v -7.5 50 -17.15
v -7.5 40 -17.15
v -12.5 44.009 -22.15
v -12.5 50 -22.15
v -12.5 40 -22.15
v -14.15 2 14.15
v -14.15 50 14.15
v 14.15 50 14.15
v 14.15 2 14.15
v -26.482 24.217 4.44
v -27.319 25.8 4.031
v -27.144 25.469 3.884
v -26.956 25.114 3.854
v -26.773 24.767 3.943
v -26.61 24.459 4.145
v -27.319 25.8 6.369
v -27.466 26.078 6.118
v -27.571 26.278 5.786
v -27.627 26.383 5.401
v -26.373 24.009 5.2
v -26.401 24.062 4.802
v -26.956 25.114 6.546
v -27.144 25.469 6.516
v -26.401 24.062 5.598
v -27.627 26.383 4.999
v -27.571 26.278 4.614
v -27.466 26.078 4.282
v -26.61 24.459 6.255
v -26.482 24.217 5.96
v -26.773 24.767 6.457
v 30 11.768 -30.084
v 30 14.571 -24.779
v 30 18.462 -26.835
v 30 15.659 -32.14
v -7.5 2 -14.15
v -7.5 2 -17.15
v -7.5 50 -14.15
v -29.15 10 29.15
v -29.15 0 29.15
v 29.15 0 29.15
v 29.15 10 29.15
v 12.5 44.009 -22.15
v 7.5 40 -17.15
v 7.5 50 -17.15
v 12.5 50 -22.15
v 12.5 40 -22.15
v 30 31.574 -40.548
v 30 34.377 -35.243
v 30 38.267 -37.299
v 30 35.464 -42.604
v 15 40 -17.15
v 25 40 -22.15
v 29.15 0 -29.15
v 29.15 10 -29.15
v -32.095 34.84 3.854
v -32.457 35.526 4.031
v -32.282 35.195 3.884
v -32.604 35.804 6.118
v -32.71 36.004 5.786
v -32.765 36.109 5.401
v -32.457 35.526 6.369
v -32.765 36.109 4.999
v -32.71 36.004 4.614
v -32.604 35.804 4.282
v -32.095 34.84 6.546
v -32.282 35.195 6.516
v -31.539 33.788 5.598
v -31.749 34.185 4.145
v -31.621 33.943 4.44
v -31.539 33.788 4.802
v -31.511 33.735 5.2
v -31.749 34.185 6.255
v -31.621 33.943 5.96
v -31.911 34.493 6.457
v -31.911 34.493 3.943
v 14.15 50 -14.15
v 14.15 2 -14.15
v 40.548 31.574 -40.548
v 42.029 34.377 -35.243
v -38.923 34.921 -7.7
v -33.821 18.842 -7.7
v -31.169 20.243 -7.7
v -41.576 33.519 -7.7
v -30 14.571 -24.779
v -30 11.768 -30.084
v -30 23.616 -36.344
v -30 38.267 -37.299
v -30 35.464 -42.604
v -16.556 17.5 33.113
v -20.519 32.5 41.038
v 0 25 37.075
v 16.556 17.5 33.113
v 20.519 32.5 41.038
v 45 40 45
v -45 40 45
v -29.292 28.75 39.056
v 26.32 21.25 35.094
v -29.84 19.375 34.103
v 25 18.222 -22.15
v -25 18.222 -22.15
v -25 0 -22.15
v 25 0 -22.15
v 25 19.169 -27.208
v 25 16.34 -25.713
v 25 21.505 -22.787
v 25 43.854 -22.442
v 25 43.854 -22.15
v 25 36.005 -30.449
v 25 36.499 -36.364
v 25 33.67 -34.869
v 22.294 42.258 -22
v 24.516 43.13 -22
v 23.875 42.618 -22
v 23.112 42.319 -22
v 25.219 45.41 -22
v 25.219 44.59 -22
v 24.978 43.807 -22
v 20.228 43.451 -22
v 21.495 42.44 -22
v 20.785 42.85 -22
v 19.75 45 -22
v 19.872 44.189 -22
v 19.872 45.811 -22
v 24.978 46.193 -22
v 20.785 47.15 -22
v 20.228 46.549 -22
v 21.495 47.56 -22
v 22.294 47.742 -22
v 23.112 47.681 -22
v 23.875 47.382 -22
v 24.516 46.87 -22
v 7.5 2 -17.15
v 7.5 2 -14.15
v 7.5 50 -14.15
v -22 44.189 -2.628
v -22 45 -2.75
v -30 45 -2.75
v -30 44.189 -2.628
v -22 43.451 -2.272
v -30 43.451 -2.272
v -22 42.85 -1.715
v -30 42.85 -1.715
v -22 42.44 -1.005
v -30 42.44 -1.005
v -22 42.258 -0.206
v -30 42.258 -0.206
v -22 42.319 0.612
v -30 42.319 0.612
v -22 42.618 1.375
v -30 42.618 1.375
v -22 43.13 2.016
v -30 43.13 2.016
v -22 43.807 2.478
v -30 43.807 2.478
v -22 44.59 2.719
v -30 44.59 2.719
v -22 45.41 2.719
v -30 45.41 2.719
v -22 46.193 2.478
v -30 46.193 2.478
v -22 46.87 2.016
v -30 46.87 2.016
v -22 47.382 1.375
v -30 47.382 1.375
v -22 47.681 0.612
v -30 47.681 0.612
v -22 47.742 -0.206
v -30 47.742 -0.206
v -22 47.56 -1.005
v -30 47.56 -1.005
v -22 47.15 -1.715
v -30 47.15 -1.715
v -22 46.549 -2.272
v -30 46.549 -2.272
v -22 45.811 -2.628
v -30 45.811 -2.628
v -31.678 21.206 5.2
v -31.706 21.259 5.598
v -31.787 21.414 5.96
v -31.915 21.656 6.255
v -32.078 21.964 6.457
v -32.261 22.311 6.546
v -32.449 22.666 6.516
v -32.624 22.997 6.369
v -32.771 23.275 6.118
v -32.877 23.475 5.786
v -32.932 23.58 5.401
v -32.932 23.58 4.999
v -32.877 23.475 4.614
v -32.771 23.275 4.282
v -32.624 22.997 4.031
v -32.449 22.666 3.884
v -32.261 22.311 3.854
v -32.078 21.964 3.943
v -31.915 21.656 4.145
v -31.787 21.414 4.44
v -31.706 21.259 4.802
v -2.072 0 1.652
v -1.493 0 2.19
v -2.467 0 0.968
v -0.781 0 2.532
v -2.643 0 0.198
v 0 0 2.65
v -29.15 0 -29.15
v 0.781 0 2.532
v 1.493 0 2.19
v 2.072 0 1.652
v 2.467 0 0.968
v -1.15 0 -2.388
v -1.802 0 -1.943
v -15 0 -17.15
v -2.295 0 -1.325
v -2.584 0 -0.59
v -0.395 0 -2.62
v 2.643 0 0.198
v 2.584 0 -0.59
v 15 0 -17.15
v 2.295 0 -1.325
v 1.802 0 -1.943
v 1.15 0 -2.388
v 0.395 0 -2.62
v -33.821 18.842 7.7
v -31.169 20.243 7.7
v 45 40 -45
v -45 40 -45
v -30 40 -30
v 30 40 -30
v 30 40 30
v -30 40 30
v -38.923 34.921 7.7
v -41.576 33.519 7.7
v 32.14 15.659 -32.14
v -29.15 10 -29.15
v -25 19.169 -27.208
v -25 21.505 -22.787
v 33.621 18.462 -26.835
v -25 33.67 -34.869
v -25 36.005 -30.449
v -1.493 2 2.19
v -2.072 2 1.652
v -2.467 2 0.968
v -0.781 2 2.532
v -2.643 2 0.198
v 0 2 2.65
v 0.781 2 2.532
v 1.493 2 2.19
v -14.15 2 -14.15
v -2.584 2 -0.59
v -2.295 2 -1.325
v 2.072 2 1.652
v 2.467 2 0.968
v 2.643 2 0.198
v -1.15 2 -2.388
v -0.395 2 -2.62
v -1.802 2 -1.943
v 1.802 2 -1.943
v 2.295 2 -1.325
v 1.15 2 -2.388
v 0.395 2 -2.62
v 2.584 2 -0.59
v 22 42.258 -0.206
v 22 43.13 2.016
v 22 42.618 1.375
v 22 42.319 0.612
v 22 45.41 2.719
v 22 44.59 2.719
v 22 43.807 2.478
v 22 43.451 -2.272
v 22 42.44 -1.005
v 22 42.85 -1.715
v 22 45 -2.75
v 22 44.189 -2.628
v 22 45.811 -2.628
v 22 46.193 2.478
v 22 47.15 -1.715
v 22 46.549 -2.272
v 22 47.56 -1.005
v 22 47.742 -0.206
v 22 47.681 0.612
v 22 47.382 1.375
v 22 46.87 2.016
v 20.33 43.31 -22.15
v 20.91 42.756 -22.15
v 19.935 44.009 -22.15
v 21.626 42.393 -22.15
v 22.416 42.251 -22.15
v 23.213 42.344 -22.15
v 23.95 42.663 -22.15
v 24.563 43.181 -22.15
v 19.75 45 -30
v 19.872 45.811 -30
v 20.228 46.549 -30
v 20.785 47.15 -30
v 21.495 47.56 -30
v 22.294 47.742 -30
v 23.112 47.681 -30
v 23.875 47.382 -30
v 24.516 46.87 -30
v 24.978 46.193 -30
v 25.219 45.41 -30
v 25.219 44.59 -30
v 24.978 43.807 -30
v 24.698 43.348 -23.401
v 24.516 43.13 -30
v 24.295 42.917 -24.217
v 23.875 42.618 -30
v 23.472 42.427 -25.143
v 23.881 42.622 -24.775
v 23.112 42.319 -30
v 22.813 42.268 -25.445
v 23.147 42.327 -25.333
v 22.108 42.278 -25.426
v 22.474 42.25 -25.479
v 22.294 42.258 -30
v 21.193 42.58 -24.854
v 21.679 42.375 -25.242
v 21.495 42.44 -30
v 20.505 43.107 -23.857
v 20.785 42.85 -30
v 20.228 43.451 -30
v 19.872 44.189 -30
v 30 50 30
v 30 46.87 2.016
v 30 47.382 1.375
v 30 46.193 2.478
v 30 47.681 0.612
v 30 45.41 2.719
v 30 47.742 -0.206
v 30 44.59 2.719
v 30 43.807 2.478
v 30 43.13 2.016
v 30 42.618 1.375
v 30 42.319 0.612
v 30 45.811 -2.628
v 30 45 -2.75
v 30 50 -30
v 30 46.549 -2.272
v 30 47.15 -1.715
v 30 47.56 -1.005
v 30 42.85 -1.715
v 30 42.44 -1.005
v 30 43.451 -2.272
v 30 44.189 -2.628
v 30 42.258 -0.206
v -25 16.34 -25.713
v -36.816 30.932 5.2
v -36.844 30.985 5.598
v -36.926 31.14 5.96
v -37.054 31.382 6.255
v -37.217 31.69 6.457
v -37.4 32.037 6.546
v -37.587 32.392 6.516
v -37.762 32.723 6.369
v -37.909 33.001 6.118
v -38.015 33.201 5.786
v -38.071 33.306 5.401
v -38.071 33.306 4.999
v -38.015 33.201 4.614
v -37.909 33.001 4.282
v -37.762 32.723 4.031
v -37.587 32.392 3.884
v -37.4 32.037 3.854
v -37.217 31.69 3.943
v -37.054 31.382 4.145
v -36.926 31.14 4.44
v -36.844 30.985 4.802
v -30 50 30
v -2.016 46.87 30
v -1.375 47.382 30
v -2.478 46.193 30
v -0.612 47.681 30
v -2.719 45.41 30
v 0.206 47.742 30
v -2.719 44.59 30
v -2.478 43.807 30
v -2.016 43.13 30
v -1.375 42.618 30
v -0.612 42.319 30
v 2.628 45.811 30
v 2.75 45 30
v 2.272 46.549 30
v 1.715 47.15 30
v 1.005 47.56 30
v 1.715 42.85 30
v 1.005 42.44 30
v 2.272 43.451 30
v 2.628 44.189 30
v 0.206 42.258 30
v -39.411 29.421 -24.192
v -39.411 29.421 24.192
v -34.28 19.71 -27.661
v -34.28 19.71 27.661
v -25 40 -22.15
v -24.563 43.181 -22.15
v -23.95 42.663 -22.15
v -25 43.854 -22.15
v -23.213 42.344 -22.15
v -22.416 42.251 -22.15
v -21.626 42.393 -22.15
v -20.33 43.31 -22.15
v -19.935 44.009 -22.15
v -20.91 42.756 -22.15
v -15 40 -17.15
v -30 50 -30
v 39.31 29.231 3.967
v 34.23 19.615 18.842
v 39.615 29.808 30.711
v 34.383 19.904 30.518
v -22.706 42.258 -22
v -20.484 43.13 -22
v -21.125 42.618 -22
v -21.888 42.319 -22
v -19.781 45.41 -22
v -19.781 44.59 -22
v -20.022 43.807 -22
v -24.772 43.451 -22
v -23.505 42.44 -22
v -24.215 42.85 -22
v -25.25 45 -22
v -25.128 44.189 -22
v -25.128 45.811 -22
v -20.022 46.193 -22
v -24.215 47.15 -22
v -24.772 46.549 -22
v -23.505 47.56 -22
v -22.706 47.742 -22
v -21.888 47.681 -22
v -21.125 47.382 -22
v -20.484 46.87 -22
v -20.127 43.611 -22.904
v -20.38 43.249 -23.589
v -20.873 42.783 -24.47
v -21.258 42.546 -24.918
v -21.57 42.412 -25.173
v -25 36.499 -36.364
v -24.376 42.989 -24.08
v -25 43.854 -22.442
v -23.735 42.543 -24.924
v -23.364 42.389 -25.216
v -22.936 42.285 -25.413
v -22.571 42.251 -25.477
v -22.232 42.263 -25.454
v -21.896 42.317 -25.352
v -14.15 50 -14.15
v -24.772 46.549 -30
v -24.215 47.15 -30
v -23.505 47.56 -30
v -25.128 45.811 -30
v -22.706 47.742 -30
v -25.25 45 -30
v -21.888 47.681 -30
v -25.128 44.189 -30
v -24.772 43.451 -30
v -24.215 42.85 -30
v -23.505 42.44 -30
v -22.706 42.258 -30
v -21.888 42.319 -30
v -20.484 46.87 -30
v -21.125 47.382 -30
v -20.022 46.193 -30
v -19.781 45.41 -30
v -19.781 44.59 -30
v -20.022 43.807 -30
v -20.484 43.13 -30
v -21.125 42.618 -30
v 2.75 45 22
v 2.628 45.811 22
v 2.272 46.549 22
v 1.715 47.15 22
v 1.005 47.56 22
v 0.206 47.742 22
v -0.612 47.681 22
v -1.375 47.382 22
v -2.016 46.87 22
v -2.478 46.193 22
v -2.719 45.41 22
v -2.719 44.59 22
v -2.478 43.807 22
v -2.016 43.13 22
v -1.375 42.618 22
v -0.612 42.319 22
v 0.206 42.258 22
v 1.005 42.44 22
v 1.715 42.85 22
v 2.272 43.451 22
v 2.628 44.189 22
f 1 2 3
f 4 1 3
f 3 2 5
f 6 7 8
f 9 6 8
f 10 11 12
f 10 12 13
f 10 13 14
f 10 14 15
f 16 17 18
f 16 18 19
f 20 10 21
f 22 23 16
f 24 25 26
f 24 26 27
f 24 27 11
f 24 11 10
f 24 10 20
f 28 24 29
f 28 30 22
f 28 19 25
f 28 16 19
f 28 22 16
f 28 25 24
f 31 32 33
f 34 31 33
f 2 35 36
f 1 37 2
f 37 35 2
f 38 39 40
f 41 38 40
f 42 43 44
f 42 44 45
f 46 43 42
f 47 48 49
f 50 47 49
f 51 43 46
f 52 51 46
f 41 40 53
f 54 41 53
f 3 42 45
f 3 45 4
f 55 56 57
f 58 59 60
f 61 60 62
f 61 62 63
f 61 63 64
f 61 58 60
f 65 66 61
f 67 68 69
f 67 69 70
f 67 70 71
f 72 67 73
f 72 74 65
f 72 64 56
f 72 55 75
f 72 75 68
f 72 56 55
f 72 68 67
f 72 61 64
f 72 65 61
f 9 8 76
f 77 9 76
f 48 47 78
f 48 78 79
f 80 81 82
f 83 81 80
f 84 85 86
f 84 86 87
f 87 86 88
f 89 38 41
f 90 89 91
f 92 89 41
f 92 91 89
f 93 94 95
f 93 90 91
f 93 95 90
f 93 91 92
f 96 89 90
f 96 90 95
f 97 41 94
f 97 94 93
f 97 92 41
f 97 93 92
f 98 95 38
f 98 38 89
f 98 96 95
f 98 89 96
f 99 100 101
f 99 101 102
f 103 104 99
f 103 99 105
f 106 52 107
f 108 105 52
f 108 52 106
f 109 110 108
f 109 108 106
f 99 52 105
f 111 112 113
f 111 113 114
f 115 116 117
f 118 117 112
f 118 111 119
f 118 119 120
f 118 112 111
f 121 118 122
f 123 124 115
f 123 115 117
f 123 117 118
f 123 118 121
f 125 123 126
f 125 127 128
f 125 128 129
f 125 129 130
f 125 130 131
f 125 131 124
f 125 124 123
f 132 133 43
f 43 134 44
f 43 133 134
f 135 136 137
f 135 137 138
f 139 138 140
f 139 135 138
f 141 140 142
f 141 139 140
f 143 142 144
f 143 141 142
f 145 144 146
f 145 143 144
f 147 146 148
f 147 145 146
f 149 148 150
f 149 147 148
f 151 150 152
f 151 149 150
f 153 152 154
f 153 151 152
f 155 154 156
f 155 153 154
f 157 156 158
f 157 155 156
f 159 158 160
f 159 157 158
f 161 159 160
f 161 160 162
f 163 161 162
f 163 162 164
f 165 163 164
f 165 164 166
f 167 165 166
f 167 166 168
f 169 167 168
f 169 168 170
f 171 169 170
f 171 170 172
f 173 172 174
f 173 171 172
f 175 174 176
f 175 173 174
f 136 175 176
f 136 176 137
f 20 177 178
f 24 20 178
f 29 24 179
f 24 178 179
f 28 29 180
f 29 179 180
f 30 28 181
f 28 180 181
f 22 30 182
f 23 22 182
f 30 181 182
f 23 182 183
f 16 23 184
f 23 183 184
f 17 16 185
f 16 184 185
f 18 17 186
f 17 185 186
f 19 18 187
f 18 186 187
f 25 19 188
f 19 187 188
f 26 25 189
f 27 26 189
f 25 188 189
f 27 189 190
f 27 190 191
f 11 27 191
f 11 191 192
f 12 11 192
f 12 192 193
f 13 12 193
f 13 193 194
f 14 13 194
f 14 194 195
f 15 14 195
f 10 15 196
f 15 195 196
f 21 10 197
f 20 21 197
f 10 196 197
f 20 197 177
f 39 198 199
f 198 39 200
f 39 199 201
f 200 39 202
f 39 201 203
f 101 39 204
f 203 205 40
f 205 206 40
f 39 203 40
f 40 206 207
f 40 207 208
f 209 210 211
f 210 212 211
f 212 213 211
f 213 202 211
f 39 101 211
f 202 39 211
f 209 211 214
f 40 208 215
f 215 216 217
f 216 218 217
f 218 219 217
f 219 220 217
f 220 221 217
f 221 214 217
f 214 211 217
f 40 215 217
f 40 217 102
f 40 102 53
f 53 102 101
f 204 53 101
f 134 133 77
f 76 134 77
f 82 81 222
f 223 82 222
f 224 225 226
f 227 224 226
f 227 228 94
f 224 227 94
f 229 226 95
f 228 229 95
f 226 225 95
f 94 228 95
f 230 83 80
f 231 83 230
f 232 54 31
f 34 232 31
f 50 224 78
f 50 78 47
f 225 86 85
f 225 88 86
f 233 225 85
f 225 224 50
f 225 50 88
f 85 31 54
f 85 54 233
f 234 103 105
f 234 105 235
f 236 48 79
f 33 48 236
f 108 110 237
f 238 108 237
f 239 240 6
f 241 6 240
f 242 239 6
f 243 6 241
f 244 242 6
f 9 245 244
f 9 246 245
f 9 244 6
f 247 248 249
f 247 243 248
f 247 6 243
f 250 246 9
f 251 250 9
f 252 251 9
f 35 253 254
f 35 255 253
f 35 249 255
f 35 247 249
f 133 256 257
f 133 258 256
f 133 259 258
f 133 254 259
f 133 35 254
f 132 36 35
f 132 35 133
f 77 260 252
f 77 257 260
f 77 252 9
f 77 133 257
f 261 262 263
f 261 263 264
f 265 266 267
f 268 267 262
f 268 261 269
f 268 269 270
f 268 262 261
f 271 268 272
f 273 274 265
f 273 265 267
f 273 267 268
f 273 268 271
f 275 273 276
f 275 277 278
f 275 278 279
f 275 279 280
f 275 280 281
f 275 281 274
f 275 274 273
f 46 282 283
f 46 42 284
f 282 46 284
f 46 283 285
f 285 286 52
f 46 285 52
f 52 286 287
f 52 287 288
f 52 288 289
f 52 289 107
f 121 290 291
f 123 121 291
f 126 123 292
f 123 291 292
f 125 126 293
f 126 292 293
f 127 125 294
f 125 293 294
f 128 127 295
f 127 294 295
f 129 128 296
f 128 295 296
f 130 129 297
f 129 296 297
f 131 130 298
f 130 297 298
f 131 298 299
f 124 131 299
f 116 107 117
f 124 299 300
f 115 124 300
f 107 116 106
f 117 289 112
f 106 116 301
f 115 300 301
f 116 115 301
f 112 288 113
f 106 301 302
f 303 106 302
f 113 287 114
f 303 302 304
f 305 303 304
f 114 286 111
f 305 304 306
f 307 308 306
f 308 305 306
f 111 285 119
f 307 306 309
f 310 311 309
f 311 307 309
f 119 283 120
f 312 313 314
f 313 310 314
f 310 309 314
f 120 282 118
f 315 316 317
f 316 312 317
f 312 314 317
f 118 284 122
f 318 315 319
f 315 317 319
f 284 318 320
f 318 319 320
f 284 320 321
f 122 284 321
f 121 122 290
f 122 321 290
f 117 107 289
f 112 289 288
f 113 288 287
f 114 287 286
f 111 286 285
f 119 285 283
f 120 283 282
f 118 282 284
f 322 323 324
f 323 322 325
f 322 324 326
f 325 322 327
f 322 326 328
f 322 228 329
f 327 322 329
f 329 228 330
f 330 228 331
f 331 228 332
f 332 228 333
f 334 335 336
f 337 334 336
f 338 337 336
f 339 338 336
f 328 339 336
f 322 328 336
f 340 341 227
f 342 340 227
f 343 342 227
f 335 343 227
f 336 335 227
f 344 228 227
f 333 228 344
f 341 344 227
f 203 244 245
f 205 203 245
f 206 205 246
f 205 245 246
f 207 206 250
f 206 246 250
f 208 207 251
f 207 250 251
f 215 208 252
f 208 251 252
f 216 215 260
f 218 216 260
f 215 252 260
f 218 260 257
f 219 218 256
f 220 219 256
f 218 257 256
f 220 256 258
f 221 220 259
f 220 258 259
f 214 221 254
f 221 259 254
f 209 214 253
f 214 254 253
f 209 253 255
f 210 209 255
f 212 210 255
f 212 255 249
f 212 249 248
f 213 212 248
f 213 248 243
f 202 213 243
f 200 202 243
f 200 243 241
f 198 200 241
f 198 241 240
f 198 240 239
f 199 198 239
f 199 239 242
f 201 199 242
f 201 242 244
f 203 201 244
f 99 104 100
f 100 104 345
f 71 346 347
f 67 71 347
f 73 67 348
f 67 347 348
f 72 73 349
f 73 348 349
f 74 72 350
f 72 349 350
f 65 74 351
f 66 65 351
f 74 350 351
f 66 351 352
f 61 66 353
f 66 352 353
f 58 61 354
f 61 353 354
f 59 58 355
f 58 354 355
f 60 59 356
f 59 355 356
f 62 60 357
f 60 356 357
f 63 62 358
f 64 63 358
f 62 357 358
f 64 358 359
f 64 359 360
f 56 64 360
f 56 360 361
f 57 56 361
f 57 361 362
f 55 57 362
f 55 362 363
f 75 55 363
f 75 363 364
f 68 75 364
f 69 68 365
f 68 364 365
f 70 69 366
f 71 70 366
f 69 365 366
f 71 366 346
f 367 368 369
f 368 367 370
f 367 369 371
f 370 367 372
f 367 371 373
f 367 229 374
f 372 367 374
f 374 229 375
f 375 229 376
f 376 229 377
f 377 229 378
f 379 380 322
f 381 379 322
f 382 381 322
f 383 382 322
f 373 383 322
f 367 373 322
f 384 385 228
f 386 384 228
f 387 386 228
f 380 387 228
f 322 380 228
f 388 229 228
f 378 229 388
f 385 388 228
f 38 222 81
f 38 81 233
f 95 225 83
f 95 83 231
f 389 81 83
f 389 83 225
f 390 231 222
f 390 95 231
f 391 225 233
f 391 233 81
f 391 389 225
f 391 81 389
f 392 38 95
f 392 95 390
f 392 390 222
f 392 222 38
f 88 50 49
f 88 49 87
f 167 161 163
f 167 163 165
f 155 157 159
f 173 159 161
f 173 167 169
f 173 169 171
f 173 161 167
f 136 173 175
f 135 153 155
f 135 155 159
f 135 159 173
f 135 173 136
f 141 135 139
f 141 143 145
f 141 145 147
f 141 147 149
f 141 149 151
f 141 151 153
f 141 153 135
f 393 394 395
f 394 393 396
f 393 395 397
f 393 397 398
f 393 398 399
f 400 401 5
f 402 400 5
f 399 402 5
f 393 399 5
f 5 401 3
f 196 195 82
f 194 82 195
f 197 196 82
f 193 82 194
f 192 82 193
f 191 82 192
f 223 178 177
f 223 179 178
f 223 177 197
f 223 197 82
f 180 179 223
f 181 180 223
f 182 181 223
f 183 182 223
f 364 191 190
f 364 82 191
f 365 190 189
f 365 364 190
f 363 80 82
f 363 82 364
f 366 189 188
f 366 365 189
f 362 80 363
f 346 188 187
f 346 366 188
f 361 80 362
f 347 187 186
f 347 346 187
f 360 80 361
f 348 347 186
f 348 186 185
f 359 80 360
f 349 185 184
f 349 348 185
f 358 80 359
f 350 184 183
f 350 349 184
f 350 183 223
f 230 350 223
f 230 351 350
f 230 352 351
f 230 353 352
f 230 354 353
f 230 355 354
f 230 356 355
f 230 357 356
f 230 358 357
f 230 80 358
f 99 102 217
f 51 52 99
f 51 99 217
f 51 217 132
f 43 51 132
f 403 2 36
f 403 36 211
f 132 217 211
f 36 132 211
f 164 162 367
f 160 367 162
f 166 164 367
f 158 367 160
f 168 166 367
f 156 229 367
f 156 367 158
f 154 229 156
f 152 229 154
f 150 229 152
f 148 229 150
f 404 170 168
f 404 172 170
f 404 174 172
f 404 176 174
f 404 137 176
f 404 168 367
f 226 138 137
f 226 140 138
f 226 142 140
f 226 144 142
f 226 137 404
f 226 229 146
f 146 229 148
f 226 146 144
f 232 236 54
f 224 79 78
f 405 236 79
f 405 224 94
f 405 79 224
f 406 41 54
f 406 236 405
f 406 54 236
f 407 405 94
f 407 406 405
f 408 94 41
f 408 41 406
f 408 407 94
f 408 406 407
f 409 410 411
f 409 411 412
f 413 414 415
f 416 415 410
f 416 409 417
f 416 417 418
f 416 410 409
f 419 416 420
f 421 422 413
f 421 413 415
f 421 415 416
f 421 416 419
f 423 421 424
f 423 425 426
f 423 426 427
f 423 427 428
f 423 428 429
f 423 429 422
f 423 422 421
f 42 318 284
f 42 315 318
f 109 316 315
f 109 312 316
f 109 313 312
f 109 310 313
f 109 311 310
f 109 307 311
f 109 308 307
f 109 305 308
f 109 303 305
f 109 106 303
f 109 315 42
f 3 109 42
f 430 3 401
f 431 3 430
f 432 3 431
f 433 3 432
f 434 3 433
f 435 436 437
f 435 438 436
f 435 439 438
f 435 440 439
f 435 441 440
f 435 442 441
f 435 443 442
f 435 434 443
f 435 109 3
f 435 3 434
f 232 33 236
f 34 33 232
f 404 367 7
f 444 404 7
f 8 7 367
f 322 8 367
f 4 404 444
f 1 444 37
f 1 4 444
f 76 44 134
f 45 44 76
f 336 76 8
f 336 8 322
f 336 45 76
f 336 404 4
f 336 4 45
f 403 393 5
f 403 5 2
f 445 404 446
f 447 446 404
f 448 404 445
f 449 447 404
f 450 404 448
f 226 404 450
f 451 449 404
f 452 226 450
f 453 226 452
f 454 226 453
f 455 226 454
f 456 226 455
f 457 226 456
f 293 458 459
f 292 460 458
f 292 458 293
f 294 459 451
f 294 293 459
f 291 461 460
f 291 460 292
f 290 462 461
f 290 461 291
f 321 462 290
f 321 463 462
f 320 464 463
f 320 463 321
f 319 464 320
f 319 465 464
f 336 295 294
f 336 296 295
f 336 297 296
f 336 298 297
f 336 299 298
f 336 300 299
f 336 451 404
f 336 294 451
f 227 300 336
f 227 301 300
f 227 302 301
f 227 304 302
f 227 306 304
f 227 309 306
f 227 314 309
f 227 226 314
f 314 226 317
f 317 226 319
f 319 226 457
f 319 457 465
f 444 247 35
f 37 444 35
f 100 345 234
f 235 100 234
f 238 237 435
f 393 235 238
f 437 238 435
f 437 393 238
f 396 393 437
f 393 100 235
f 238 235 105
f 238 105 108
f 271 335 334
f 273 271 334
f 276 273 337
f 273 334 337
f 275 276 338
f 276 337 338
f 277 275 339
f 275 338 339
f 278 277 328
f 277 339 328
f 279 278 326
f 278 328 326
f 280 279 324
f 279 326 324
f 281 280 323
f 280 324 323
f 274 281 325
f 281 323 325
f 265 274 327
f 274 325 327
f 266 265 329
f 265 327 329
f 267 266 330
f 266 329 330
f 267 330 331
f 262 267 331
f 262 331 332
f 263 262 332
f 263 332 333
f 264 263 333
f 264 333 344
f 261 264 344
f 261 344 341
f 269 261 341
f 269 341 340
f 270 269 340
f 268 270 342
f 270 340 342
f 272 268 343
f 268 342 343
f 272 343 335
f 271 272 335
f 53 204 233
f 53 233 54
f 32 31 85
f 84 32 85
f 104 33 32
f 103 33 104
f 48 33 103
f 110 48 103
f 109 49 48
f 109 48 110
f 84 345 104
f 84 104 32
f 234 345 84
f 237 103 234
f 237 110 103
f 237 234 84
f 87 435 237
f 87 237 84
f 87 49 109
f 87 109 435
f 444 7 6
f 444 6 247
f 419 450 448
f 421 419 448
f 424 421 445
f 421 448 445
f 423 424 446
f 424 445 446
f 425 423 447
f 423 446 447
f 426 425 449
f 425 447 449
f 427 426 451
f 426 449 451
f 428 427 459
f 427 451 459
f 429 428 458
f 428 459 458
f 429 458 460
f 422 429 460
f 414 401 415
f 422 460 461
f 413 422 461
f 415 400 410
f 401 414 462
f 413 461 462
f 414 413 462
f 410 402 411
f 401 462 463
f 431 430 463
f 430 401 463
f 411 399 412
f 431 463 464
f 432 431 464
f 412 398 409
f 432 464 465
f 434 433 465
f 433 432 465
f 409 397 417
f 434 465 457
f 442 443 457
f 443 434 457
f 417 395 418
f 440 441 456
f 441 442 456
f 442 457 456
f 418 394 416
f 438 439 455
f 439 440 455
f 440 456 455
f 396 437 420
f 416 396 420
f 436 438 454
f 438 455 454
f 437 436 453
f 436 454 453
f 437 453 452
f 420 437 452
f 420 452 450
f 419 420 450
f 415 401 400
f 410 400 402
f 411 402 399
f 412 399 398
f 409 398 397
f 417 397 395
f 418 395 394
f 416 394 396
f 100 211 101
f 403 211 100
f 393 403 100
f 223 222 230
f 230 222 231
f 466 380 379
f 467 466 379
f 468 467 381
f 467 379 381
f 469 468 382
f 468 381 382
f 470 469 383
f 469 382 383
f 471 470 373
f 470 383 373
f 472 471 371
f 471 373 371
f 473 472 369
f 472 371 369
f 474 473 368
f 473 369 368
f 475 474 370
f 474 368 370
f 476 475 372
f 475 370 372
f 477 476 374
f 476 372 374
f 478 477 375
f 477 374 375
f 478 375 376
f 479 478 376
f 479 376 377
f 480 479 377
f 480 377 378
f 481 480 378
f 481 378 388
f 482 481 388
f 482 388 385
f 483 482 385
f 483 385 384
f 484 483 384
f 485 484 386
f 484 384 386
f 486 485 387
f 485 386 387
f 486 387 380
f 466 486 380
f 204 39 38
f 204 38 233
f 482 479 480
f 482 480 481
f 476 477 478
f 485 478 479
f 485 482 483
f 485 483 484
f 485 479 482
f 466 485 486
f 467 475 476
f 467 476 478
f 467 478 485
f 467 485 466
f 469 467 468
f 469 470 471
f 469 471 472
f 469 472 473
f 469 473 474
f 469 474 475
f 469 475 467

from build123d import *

# Parameters (mm, degrees)
SKETCH1_W                = 58.3
SKETCH1_H                = 58.3
SKETCH1_W_2              = 28.3
SKETCH1_H_2              = 28.3
BOSS_EXTRUDE1_DEPTH      = 10
SKETCH4_W                = 60
SKETCH4_H                = 60
BOSS_EXTRUDE2_DEPTH      = 10
SKETCH6_W                = 60
SKETCH6_H                = 26.8
ESP32_DEPTH              = 6
SKETCH8_W                = 28.3
SKETCH8_H                = 28.3
CUT_EXTRUDE3_DEPTH       = 48
SKETCH10_W               = 30
SKETCH10_H               = 5
CUT_EXTRUDE5_DEPTH       = 50
CUT_EXTRUDE2_REACH       = 95.195
SKETCH7_W                = 50
SKETCH7_H                = 3.2
CUT_EXTRUDE6_START       = -10
CUT_EXTRUDE6_DEPTH       = 71.932070392
CUT_EXTRUDE7_START       = -25
CUT_EXTRUDE7_DEPTH       = 50
CUT_EXTRUDE8_REACH       = 102.747
SKETCH14_W               = 15
SKETCH14_H               = 3
CUT_EXTRUDE9_DEPTH       = 48
CHAMFER1_SIZE            = 7.5
CUT_EXTRUDE10_REACH      = 81.712
SKETCH15_R               = 2.65
SKETCH16_W               = 15.4
SKETCH16_H               = 16.6
CANBUS_DEPTH             = 3
SKETCH18_R               = 1.35
M2_CANBUS_HEAT_SET_DEPTH = 6
SKETCH19_R               = 2.75
CUT_EXTRUDE13_DEPTH      = 8
SKETCH20_R               = 2.75
CUT_EXTRUDE14_DEPTH      = 8
SKETCH21_R               = 2.75
CUT_EXTRUDE15_DEPTH      = 8
CUT_EXTRUDE16_START      = -8
SKETCH22_R               = 2.75
CUT_EXTRUDE16_DEPTH      = 8


# Read off the part's stored shape, not the designer's step: Cut-Extrude7
with BuildPart() as part:
    # Sketch1 → Boss-Extrude1 (new body)
    # profile 1 of 2: a face of its own
    with BuildSketch(Plane(origin=(0, 0, 0), x_dir=(1, 0, 0), z_dir=(0, 1, 0))):
        Rectangle(SKETCH1_W, SKETCH1_H)
        Rectangle(SKETCH1_W_2, SKETCH1_H_2, mode=Mode.SUBTRACT)
    # profile 2 of 2: a face of its own
    with BuildSketch(Plane(origin=(0, 0, 0), x_dir=(1, 0, 0), z_dir=(0, 1, 0))):
        Rectangle(SKETCH1_W_2, SKETCH1_H_2)
    extrude(amount=BOSS_EXTRUDE1_DEPTH)

    # Sketch2 → section 1 of loft1
    with BuildSketch(Plane(origin=(0, 40, 0), x_dir=(1, 0, 0), z_dir=(0, 1, 0)), mode=Mode.PRIVATE) as loft1_s1:
        with BuildLine():
            Line((-45, -45), (45, -45))
            Line((45, -45), (45, 45))
            Line((45, 45), (-45, 45))
            Line((-45, 45), (-45, -45))
        make_face()
    # loft from a face of the part (loft1)
    loft([part.faces().sort_by_distance((0, 10, 0))[0], loft1_s1.sketch])

    # Sketch4 → Boss-Extrude2 (add)
    with BuildSketch(Plane(origin=(0, 40, 0), x_dir=(1, 0, 0), z_dir=(0, 1, 0))):
        Rectangle(SKETCH4_W, SKETCH4_H)
    extrude(amount=BOSS_EXTRUDE2_DEPTH)

    # Sketch6 → ESP32 (cut)
    with BuildSketch(Plane(origin=(0, -9.857868483, -18.658426151), x_dir=(-1, 0, 0), z_dir=(0, -0.4671427704257183, -0.8841818998594039))):
        with Locations((0, 37.859030757)):
            Rectangle(SKETCH6_W, SKETCH6_H)
    extrude(amount=-ESP32_DEPTH, mode=Mode.SUBTRACT)

    # Sketch8 → Cut-Extrude3 (cut)
    with BuildSketch(Plane(origin=(0, 50, 0), x_dir=(1, 0, 0), z_dir=(0, 1, 0))):
        Rectangle(SKETCH8_W, SKETCH8_H)
    extrude(amount=-CUT_EXTRUDE3_DEPTH, mode=Mode.SUBTRACT)

    # Sketch10 → Cut-Extrude5 (cut)
    with BuildSketch(Plane(origin=(0, 0, 0), x_dir=(-1, 0, 0), z_dir=(0, -1, 0))):
        with Locations((0, 19.65)):
            Rectangle(SKETCH10_W, SKETCH10_H)
    extrude(amount=-CUT_EXTRUDE5_DEPTH, mode=Mode.SUBTRACT)

    # Cut-Extrude2: up to this plane
    cut_extrude2_end = Plane(origin=(-15, 50, -22.15), z_dir=(0, 0, -1))
    # Sketch7 → Cut-Extrude2 (cut, up to the surface)
    with BuildSketch(Plane(origin=(0, -7.055011861, -13.353334752), x_dir=(-1, 0, 0), z_dir=(0, -0.46714277042571845, -0.8841818998594037)), mode=Mode.PRIVATE) as cut_extrude2_sk1:
        with Locations((0, 47.659030757)):
            Rectangle(SKETCH7_W, SKETCH7_H)
    cut_extrude2_tool1 = split(extrude(cut_extrude2_sk1.sketch, amount=-CUT_EXTRUDE2_REACH, mode=Mode.PRIVATE), bisect_by=cut_extrude2_end, keep=Keep.BOTH, mode=Mode.PRIVATE)
    add(cut_extrude2_tool1.solids().sort_by_distance((0, 35.08424, -35.616906))[0], mode=Mode.SUBTRACT)
    # Sketch7 → Cut-Extrude2 (cut, up to the surface)
    with BuildSketch(Plane(origin=(0, -7.055011861, -13.353334752), x_dir=(-1, 0, 0), z_dir=(0, -0.46714277042571845, -0.8841818998594037)), mode=Mode.PRIVATE) as cut_extrude2_sk2:
        with Locations((0, 28.059030757)):
            Rectangle(SKETCH7_W, SKETCH7_H)
    cut_extrude2_tool2 = split(extrude(cut_extrude2_sk2.sketch, amount=-CUT_EXTRUDE2_REACH, mode=Mode.PRIVATE), bisect_by=cut_extrude2_end, keep=Keep.BOTH, mode=Mode.PRIVATE)
    add(cut_extrude2_tool2.solids().sort_by_distance((0, 17.754275, -26.460908))[0], mode=Mode.SUBTRACT)

    # Sketch11 → Cut-Extrude6 (cut, through all)
    with BuildSketch(Plane(origin=(0, 50, 0), x_dir=(1, 0, 0), z_dir=(0, 1, 0)).offset(CUT_EXTRUDE6_START)):
        Polygon((-25, 22.15), (25, 22.15), (15, 17.15), (-15, 17.15), align=None)
    extrude(amount=-CUT_EXTRUDE6_DEPTH, mode=Mode.SUBTRACT)

    # Cut-Extrude7 outline → Cut-Extrude7 (cut)
    with BuildSketch(Plane.YZ.offset(CUT_EXTRUDE7_START)):
        Polygon((40.38967366, -22.15), (21.841454111, -22.15), (21.504680154, -22.787427049), (36.005263311, -30.448568484), align=None)
    extrude(amount=CUT_EXTRUDE7_DEPTH, mode=Mode.SUBTRACT)

    # Cut-Extrude8: up to this plane
    cut_extrude8_end = Plane(origin=(18.658426151, -9.857868483, 0), z_dir=(-0.884181899859404, 0.4671427704257181, 0))
    # Sketch13 → Cut-Extrude8 (cut, up to the surface)
    with BuildSketch(Plane.ZY.offset(-30), mode=Mode.PRIVATE) as cut_extrude8_sk1:
        Polygon((-32.139713731, 15.658764159), (-40.548283598, 31.574038357), (-35.243192199, 34.376894979), (-26.834622332, 18.461620782), align=None)
    cut_extrude8_tool1 = split(extrude(cut_extrude8_sk1.sketch, amount=-CUT_EXTRUDE8_REACH, mode=Mode.PRIVATE), bisect_by=cut_extrude8_end, keep=Keep.BOTH, mode=Mode.PRIVATE)
    add(cut_extrude8_tool1.solids().sort_by_distance((30, 25.01783, -33.691453))[0], mode=Mode.SUBTRACT)

    # Sketch14 → Cut-Extrude9 (cut)
    with BuildSketch(Plane(origin=(0, 50, 0), x_dir=(1, 0, 0), z_dir=(0, 1, 0))):
        with Locations((0, 15.65)):
            Rectangle(SKETCH14_W, SKETCH14_H)
    extrude(amount=-CUT_EXTRUDE9_DEPTH, mode=Mode.SUBTRACT)

    # Chamfer1
    # the kernel refuses this chamfer: 7.5 mm, written as the material it adds along each edge
    with BuildSketch(Plane(origin=(15, 40, -17.15), x_dir=(-0.9996219169112968, 0, 0.02749587661058632), z_dir=(0, 1, 0))) as chamfer1_piece_1_section:
        Polygon((CHAMFER1_SIZE * 0.999621916911, -CHAMFER1_SIZE * 0.0274958766106), (-CHAMFER1_SIZE * 0.0274958766106, -CHAMFER1_SIZE * 0.999621916911), (0, 0), align=None)
    chamfer1_piece_1 = extrude(amount=10, mode=Mode.PRIVATE)
    chamfer1_piece_1 = split(chamfer1_piece_1, bisect_by=Plane(origin=(12.200765376, 42.822931518, -22.15), z_dir=(0, 0, 1)), keep=Keep.TOP, mode=Mode.PRIVATE)
    add(chamfer1_piece_1)
    with BuildSketch(Plane(origin=(-15, 40, -17.15), x_dir=(0.9996219169112968, 0, 0.02749587661058632), z_dir=(0, 1, 0))) as chamfer1_piece_2_section:
        Polygon((CHAMFER1_SIZE * 0.999621916911, CHAMFER1_SIZE * 0.0274958766106), (-CHAMFER1_SIZE * 0.0274958766106, CHAMFER1_SIZE * 0.999621916911), (0, 0), align=None)
    chamfer1_piece_2 = extrude(amount=10, mode=Mode.PRIVATE)
    chamfer1_piece_2 = split(chamfer1_piece_2, bisect_by=Plane(origin=(-12.200765376, 42.822931518, -22.15), z_dir=(0, 0, 1)), keep=Keep.TOP, mode=Mode.PRIVATE)
    add(chamfer1_piece_2)

    # Sketch15 → Cut-Extrude10 (cut, up to next)
    with BuildSketch(Plane(origin=(0, 2, 0), x_dir=(1, 0, 0), z_dir=(0, 1, 0)), mode=Mode.PRIVATE) as cut_extrude10_sk1:
        with Locations(Location((0, 0, 0), (0, 0, 270))):
            Circle(SKETCH15_R)
    cut_extrude10_tool1 = extrude(cut_extrude10_sk1.sketch, amount=-CUT_EXTRUDE10_REACH, mode=Mode.PRIVATE) & part.part
    add(cut_extrude10_tool1.solids().sort_by_distance((0, 2, 0))[0], mode=Mode.SUBTRACT)

    # Sketch16 → CANbus (cut)
    with BuildSketch(Plane(origin=(-18.658426151, -9.857868483, 0), x_dir=(0, 0, 1), z_dir=(-0.8841818998594037, -0.46714277042571845, 0))):
        with Locations((0, 40.759030757)):
            Rectangle(SKETCH16_W, SKETCH16_H)
    extrude(amount=-CANBUS_DEPTH, mode=Mode.SUBTRACT)

    # Sketch18 → M2-CANbus-Heat-Set (cut)
    with BuildSketch(Plane(origin=(-16.005880452, -8.456440172, 0), x_dir=(0, 0, 1), z_dir=(-0.8841818998594035, -0.46714277042571867, 0))):
        with Locations(Location((5.2, 45.898343703, 0), (0, 0, 270))):
            Circle(SKETCH18_R)
        with Locations(Location((5.2, 34.898343703, 0), (0, 0, 270))):
            Circle(SKETCH18_R)
    extrude(amount=-M2_CANBUS_HEAT_SET_DEPTH, mode=Mode.SUBTRACT)

    # Sketch19 → Cut-Extrude13 (cut)
    with BuildSketch(Plane(origin=(0, 0, -30), x_dir=(-1, 0, 0), z_dir=(0, 0, -1))):
        with Locations((-22.5, 45)):
            Circle(SKETCH19_R)
        with Locations((22.5, 45)):
            Circle(SKETCH19_R)
    extrude(amount=-CUT_EXTRUDE13_DEPTH, mode=Mode.SUBTRACT)

    # Sketch20 → Cut-Extrude14 (cut)
    with BuildSketch(Plane(origin=(30, 0, 0), x_dir=(0, 0, -1), z_dir=(1, 0, 0))):
        with Locations((0, 45)):
            Circle(SKETCH20_R)
    extrude(amount=-CUT_EXTRUDE14_DEPTH, mode=Mode.SUBTRACT)

    # Sketch21 → Cut-Extrude15 (cut)
    with BuildSketch(Plane.XY.offset(30)):
        with Locations((0, 45)):
            Circle(SKETCH21_R)
    extrude(amount=-CUT_EXTRUDE15_DEPTH, mode=Mode.SUBTRACT)

    # Sketch22 → Cut-Extrude16 (cut)
    with BuildSketch(Plane.ZY.offset(30).offset(CUT_EXTRUDE16_START)):
        with Locations(Location((0, 45, 0), (0, 0, 180))):
            Circle(SKETCH22_R)
    extrude(amount=CUT_EXTRUDE16_DEPTH, mode=Mode.SUBTRACT)


solid = part.part
